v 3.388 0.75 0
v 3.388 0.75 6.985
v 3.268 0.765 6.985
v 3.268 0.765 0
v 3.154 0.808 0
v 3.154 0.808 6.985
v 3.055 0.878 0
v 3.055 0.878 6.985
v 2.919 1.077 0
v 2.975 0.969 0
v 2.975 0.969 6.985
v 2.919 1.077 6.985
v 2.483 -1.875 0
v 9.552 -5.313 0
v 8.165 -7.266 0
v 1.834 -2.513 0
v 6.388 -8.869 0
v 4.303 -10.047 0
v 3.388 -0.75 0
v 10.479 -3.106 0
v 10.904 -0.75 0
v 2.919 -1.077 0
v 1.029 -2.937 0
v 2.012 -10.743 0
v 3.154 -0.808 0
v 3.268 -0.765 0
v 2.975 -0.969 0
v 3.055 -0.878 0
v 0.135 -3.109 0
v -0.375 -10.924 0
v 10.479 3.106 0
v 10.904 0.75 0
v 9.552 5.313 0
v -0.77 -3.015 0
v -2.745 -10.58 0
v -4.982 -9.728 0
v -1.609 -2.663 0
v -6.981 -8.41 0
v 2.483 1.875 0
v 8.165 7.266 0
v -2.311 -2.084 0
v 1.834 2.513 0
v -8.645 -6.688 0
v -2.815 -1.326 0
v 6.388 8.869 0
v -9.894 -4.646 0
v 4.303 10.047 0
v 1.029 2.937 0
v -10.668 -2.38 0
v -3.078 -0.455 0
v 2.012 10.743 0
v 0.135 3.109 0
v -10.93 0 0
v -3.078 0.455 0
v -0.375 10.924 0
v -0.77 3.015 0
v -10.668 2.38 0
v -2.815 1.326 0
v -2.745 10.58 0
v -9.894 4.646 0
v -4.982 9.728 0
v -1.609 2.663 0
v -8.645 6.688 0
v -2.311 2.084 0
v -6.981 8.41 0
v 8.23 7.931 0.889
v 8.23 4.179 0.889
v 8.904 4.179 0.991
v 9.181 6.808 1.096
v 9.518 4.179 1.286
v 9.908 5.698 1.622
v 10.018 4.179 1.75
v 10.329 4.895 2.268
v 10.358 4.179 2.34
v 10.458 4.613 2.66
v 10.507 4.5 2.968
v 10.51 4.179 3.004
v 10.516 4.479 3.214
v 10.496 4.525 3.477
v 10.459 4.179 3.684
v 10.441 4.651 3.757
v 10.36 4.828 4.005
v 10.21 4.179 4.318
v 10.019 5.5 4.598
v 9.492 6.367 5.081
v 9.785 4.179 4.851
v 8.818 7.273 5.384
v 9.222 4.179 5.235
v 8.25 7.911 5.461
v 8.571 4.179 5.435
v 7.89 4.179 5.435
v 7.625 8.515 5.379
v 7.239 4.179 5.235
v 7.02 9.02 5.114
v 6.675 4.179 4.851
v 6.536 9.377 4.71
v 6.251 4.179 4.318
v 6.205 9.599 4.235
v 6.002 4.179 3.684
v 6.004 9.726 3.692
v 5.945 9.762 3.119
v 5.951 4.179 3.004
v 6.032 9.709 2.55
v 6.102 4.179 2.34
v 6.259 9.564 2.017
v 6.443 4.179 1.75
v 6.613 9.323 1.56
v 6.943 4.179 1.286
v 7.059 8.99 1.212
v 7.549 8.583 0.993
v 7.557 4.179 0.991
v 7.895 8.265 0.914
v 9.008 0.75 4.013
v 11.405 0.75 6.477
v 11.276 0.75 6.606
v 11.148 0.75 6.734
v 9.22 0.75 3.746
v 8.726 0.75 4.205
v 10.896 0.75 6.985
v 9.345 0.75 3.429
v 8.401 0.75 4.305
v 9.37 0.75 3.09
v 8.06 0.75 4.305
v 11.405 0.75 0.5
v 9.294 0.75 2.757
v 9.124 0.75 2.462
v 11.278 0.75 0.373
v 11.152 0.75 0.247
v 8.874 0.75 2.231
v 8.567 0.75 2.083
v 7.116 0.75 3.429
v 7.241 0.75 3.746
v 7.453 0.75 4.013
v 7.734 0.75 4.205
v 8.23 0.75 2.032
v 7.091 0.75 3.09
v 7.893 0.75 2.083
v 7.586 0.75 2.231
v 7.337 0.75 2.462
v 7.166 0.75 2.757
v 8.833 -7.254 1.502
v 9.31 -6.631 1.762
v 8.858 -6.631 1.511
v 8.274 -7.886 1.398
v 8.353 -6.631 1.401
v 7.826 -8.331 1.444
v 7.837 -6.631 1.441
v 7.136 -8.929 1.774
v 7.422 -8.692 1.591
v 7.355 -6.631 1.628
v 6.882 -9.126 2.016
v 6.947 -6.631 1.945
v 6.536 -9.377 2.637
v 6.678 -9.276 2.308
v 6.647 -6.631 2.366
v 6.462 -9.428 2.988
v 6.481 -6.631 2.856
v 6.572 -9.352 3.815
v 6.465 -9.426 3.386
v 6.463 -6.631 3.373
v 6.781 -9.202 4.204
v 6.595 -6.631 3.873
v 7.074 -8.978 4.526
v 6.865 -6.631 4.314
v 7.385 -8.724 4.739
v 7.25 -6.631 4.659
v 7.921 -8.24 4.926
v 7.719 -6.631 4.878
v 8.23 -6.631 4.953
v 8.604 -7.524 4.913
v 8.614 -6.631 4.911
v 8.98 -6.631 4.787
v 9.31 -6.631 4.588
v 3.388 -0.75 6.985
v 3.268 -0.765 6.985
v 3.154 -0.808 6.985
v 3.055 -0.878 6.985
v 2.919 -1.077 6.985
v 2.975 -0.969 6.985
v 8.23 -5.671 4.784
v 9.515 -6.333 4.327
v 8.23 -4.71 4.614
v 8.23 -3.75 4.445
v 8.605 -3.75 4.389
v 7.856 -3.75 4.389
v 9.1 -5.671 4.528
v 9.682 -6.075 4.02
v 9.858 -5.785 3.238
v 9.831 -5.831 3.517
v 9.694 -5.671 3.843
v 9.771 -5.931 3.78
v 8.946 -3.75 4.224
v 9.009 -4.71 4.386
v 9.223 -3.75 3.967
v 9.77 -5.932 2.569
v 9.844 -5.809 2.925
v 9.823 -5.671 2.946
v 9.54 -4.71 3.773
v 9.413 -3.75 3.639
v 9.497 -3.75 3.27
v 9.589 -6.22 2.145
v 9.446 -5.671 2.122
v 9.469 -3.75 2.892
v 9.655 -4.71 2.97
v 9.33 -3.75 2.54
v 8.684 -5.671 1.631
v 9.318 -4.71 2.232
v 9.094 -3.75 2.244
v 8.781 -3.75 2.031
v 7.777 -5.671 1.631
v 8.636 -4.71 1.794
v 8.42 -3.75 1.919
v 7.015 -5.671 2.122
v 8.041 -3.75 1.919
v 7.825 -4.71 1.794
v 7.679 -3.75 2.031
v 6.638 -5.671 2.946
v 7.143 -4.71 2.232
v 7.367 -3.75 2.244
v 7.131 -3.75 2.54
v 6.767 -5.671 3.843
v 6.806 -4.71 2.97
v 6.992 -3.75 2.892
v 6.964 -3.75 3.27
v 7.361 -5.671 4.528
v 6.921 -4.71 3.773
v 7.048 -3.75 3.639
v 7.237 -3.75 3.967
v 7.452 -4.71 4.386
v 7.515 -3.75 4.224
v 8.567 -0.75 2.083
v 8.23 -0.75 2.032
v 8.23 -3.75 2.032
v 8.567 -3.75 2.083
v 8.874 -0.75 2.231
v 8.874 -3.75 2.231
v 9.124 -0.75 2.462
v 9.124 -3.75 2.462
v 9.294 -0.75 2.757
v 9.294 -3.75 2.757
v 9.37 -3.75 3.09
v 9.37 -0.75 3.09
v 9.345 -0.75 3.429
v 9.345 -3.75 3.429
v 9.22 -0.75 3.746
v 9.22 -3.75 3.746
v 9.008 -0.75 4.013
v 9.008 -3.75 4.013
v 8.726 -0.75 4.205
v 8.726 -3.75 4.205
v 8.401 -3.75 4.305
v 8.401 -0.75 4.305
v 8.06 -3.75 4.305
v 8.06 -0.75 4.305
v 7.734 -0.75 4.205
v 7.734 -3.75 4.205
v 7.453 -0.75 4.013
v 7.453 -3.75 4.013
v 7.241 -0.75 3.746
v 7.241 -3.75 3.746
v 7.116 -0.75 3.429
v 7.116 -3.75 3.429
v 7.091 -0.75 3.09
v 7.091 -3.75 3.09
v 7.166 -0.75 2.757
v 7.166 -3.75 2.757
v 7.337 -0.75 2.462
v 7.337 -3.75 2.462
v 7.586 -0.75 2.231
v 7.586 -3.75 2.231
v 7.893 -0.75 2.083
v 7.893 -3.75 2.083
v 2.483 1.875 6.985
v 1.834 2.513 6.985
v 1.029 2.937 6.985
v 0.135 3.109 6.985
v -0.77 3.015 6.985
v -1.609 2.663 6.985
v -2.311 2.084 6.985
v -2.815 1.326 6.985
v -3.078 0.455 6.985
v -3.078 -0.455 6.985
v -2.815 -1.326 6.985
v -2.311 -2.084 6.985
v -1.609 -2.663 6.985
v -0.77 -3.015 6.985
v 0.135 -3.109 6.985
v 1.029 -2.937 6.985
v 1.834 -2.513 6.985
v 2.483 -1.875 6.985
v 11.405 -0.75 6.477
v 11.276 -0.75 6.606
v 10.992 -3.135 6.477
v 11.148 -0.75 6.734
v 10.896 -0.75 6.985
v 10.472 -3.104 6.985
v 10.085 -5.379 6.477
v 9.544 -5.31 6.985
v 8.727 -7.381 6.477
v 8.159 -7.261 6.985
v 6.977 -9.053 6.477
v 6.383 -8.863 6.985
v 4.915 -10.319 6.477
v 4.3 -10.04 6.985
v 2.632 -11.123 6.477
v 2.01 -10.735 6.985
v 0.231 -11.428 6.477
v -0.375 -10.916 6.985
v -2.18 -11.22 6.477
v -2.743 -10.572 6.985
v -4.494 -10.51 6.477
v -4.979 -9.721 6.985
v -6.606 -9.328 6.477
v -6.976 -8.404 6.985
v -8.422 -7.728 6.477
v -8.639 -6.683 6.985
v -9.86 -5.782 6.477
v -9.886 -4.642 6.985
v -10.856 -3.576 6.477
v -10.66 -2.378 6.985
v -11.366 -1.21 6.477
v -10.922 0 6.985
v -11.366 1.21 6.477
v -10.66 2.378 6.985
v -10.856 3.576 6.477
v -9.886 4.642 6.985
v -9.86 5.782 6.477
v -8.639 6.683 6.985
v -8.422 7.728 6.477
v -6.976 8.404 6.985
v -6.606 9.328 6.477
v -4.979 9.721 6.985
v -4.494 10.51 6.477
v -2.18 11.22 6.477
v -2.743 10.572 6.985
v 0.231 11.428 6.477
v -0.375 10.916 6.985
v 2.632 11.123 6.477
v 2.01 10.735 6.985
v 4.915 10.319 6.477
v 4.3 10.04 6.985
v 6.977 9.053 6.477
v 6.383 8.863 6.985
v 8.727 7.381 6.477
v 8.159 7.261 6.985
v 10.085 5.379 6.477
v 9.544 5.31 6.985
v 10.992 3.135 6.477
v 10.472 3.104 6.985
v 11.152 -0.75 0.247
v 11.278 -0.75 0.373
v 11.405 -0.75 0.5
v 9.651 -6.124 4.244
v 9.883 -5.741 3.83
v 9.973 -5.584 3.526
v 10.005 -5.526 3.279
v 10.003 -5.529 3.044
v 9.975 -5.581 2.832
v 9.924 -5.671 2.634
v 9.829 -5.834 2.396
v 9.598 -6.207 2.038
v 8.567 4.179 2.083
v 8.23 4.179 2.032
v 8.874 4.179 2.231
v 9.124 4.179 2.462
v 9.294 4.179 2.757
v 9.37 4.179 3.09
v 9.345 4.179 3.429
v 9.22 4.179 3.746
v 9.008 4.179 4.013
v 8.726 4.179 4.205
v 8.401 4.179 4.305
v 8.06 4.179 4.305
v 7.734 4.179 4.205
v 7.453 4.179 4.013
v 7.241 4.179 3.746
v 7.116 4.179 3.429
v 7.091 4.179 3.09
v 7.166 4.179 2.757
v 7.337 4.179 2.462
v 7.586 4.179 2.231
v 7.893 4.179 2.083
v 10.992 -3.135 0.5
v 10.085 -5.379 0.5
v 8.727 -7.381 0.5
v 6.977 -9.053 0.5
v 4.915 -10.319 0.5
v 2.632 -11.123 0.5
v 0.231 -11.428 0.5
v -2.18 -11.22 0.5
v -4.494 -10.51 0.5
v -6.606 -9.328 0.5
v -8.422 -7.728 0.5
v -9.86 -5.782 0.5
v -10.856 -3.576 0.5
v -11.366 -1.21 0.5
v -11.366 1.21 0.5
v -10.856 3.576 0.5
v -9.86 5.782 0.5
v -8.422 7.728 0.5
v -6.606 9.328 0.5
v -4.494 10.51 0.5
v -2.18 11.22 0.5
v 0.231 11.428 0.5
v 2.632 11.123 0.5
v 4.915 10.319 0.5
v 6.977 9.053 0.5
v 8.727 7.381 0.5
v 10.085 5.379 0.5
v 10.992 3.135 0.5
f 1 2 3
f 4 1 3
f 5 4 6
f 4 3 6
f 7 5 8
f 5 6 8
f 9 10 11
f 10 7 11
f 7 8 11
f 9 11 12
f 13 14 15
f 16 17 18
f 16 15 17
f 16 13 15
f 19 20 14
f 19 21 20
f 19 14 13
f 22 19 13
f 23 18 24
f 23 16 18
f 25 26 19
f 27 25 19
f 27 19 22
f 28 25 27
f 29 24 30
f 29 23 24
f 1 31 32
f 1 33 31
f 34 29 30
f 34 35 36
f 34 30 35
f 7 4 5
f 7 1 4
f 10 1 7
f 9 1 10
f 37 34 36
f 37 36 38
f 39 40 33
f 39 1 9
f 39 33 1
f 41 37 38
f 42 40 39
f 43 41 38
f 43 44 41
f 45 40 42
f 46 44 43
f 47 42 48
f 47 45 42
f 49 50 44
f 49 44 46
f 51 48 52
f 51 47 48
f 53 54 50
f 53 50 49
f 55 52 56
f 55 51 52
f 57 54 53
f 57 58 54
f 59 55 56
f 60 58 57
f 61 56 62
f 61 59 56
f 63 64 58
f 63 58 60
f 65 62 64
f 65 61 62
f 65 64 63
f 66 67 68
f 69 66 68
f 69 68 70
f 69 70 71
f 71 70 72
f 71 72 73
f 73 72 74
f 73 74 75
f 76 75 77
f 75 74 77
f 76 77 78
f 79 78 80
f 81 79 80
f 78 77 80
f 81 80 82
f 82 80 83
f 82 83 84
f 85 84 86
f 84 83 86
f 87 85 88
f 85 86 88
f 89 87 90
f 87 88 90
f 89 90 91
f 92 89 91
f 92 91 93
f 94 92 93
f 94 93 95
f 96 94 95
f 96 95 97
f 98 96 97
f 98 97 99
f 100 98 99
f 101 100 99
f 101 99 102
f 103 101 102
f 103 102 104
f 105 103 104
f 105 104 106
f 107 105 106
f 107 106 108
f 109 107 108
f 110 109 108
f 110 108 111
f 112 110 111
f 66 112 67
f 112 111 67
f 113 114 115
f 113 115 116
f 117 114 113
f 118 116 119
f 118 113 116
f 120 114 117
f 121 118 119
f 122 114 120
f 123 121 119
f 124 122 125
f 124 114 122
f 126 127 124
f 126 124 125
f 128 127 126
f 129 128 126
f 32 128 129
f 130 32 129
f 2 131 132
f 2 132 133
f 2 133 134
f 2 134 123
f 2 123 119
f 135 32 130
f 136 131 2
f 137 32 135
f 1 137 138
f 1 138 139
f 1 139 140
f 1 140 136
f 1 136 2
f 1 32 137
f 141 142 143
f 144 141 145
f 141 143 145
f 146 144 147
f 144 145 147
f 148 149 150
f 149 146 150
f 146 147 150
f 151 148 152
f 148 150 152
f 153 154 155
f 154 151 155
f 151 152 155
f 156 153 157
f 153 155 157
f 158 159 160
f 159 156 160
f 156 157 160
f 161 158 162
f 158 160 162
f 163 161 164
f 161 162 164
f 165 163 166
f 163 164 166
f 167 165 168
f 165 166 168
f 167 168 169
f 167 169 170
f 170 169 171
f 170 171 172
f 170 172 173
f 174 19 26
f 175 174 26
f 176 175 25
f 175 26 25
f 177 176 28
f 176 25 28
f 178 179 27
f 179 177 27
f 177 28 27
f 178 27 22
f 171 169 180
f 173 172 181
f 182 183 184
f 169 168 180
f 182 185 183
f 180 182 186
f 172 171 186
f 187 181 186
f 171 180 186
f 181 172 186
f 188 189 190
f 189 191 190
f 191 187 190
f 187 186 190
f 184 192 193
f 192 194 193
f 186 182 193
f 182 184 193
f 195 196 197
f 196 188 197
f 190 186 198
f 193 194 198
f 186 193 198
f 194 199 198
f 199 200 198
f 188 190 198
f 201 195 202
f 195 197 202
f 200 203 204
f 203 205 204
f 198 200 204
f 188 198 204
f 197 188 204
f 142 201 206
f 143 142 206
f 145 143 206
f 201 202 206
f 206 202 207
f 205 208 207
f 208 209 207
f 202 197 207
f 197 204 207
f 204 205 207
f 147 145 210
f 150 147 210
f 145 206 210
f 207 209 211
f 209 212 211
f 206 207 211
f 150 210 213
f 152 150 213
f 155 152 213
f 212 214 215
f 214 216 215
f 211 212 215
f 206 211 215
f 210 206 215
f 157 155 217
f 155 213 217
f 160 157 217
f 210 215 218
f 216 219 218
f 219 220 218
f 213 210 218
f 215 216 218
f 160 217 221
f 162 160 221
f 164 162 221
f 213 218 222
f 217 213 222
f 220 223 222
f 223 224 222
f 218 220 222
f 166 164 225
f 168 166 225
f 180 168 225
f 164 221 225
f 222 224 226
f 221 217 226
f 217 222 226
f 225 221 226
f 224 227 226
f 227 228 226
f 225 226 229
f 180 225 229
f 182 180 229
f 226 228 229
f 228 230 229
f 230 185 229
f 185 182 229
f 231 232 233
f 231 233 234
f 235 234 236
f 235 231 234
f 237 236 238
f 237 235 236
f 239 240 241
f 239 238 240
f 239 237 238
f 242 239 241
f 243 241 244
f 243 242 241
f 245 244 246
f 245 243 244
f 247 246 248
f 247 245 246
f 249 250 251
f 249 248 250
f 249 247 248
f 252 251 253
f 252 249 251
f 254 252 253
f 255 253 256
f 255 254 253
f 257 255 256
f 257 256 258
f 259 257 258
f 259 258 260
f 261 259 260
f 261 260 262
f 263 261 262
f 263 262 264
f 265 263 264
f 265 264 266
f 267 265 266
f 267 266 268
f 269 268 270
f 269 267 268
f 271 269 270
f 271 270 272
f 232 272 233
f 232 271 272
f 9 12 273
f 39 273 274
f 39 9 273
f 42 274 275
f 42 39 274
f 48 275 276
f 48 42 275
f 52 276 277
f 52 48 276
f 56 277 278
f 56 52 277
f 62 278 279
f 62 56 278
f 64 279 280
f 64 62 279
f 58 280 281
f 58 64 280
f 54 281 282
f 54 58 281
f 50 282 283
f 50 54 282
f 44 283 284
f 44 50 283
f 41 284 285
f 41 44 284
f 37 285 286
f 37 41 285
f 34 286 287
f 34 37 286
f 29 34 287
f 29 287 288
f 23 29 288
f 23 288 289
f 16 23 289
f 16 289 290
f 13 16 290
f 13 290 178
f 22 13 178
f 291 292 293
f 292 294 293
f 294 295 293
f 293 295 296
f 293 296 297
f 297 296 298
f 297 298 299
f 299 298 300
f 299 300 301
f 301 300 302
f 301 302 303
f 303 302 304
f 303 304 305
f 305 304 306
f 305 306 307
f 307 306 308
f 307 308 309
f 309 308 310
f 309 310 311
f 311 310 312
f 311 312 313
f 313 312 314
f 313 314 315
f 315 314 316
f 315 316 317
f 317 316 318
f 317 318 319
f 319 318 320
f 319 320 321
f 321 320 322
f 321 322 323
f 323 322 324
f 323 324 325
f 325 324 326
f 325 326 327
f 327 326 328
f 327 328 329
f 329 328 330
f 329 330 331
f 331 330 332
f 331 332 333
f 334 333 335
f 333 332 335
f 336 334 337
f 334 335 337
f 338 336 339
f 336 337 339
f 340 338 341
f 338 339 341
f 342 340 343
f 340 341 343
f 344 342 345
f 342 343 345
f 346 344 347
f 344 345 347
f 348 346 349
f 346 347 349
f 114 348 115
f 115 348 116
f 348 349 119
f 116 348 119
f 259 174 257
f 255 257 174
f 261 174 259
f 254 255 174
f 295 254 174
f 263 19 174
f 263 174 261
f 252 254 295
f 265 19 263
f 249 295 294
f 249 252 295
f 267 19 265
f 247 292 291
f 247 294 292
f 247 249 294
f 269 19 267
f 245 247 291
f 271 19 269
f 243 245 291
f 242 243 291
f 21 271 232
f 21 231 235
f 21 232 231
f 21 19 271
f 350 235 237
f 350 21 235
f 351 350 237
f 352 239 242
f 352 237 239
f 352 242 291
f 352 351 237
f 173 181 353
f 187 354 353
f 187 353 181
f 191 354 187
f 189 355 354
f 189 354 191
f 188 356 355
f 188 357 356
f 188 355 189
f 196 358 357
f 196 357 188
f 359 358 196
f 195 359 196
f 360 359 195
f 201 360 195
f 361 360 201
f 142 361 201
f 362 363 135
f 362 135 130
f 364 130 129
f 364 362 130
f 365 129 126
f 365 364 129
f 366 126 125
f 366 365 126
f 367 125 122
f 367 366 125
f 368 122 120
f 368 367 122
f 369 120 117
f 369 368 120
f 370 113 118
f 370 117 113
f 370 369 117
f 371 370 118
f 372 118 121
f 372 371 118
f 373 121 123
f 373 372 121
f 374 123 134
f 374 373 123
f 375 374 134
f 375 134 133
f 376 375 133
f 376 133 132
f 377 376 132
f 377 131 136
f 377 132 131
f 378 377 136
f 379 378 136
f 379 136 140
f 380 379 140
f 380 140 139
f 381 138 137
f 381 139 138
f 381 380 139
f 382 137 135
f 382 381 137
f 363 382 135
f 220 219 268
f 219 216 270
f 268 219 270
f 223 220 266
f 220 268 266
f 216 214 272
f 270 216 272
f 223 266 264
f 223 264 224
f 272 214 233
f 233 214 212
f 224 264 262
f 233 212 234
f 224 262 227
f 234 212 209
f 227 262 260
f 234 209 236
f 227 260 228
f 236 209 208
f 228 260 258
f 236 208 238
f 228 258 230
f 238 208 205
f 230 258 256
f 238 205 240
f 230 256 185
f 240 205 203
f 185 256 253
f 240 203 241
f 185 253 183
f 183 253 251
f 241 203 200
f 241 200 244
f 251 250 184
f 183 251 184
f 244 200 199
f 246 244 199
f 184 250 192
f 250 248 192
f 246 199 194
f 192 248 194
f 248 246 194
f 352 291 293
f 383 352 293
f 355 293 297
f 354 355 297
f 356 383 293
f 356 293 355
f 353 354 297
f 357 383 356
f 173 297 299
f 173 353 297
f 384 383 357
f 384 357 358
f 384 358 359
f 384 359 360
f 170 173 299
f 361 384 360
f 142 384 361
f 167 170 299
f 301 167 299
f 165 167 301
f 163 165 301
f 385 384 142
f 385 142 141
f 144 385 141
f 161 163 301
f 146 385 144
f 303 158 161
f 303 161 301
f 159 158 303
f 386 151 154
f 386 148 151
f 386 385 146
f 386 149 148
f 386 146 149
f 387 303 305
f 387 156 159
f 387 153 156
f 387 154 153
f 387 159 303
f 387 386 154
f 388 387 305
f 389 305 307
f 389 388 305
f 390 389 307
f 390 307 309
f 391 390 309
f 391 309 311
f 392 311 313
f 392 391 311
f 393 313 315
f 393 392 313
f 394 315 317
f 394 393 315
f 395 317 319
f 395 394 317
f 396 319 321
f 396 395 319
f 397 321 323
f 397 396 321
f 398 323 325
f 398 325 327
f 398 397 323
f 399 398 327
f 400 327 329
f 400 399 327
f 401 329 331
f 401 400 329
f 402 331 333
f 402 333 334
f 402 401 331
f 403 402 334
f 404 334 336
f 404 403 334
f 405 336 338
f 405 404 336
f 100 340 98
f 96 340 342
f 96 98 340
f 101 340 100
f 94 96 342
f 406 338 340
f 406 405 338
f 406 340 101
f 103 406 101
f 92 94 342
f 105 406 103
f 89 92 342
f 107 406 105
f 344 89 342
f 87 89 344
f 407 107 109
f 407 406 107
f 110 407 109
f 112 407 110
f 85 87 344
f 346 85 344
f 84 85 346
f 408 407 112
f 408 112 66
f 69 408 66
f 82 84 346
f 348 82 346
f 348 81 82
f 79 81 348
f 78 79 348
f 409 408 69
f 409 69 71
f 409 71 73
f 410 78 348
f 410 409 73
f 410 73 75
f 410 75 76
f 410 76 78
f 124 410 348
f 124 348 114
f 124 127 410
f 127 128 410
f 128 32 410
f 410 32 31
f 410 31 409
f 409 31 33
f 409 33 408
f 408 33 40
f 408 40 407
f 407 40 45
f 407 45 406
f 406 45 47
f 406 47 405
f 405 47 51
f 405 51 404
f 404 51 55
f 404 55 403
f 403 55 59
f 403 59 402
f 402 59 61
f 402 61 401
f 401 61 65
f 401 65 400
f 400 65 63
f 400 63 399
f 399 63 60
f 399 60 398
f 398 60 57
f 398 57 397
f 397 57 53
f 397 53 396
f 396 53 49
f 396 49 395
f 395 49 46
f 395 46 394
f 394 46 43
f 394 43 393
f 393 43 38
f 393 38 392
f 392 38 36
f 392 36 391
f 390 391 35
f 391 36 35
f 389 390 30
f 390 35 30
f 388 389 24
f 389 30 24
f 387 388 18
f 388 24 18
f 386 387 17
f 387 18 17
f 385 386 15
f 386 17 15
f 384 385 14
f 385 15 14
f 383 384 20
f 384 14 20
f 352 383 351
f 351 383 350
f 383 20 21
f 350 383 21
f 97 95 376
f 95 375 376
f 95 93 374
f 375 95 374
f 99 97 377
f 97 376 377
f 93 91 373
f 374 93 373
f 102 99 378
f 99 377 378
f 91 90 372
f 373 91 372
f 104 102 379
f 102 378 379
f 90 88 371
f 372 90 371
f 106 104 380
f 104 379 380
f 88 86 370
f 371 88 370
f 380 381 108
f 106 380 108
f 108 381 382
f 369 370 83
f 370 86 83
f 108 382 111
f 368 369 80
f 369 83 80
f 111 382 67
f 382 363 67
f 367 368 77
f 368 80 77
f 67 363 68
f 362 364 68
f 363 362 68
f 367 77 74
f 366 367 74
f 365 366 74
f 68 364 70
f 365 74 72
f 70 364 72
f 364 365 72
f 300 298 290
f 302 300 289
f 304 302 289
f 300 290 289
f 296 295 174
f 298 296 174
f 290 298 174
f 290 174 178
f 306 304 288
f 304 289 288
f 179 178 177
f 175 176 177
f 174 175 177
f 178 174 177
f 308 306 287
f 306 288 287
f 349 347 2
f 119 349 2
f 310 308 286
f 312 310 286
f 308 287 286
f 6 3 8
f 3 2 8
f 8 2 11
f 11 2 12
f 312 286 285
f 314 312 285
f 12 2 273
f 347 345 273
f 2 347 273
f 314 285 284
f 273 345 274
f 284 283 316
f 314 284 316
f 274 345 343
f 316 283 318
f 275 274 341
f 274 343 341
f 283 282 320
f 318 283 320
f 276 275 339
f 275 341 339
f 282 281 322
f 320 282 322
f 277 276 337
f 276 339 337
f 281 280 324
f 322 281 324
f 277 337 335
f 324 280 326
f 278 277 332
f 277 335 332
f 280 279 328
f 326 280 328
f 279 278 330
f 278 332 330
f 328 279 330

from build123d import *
from build123d.topology import SkipClean

# Parameters (mm, degrees)
BOSS_EXTRUDE1_DEPTH     = 6.985
CUT_EXTRUDE1_DEPTH      = 19.104903341
CUT_EXTRUDE1_DEPTH_BACK = 19.104903341
SKETCH2_R               = 1.143
SKETCH3_R               = 2.286
CUT_EXTRUDE2_DEPTH      = 21.568811653
BOSS_EXTRUDE2_START     = 1.27
BOSS_EXTRUDE2_DEPTH     = 1.27
BOSS_EXTRUDE3_START     = 2.54
SKETCH5_R               = 11.43
SKETCH5_R_2             = 3.1115
BOSS_EXTRUDE3_DEPTH     = 2.54
SKETCH29_R              = 1.778
CUT_EXTRUDE9_DEPTH      = 21.245185396
CHAMFER3_SIZE           = 2.881011164
CHAMFER3_SIZE_2         = 0.508
CHAMFER4_SIZE           = 0.508
FILLET1_R               = 0.5
SKETCH30_R              = 16.901185141
CUT_EXTRUDE10_DEPTH     = 3.81
CHAMFER5_SIZE           = 0.5


with BuildPart() as part:
    # Sketch1 → Boss-Extrude1 (new body)
    with BuildSketch(Plane.XY):
        with BuildLine():
            Line((3.019756985, -0.75), (11.405367158, -0.75))
            ThreePointArc((11.405367158, -0.75), (-11.43, 0), (11.405367158, 0.75))
            Line((11.405367158, 0.75), (3.019756985, 0.75))
            ThreePointArc((3.019756985, 0.75), (-3.1115, 0), (3.019756985, -0.75))
        make_face()
    extrude(amount=BOSS_EXTRUDE1_DEPTH)

    # Sketch2 → Cut-Extrude1 (cut, two sides: drawn at the far end of the back side and taken through both)
    with BuildSketch(Plane.XZ.offset(-0.75).offset(-CUT_EXTRUDE1_DEPTH_BACK)):
        with Locations(Location((8.230367158, 3.175, 0), (0, 0, 270))):
            Circle(SKETCH2_R)
    extrude(amount=CUT_EXTRUDE1_DEPTH + CUT_EXTRUDE1_DEPTH_BACK, mode=Mode.SUBTRACT)

    # Sketch3 → Cut-Extrude2 (cut, through all)
    with BuildSketch(Plane(origin=(0, 4.179, 0), x_dir=(-1, 0, 0), z_dir=(0, -1, 0))):
        with Locations(Location((-8.230367158, -3.175, 0), (0, 0, 90))):
            Circle(SKETCH3_R)
    extrude(amount=-CUT_EXTRUDE2_DEPTH, mode=Mode.SUBTRACT)

    # Sketch4 → Boss-Extrude2 (add)
    with BuildSketch(Plane(origin=(0, 0, 0), x_dir=(-1, 0, 0), z_dir=(0, 0, -1)).offset(BOSS_EXTRUDE2_START)):
        with BuildLine():
            Line((3.1115, 0), (11.43, 0))
            ThreePointArc((11.43, 0), (0.375202204, 11.42384013), (-11.405367158, 0.75))
            Line((-11.405367158, 0.75), (-3.019756985, 0.75))
            ThreePointArc((-3.019756985, 0.75), (0.377795176, 3.088479084), (3.1115, 0))
        make_face()
    extrude(amount=-BOSS_EXTRUDE2_DEPTH)

    # Sketch5 → Boss-Extrude3 (add)
    with SkipClean():  # the faces are left unmerged after this step: merging them gives an invalid solid
        with BuildSketch(Plane(origin=(0, 0, -1.27), x_dir=(-1, 0, 0), z_dir=(0, 0, -1)).offset(BOSS_EXTRUDE3_START)):
            Circle(SKETCH5_R)
            Circle(SKETCH5_R_2, mode=Mode.SUBTRACT)
        extrude(amount=-BOSS_EXTRUDE3_DEPTH)

    # Sketch29 → Cut-Extrude9 (cut, through all)
    with SkipClean():  # the faces are left unmerged after this step: merging them gives an invalid solid
        with BuildSketch(Plane(origin=(0, -3.75, 0), x_dir=(1, 0, 0), z_dir=(0, 1, 0))):
            with Locations(Location((8.230367158, -3.175, 0), (0, 0, 270))):
                Circle(SKETCH29_R)
        extrude(amount=-CUT_EXTRUDE9_DEPTH, mode=Mode.SUBTRACT)

    # Chamfer3
    # the kernel refuses this chamfer: 2.881011164, 0.508 mm, written as the material it adds along each edge
    with BuildSketch(Plane(origin=(8.230367158, -3.75, 3.175), x_dir=(0, 0, 1), z_dir=(-1, 0, 0))) as chamfer3_piece_1_section:
        Polygon((1.778, -CHAMFER3_SIZE), (1.778 - CHAMFER3_SIZE_2, 0), (1.778, 0), align=None)
    chamfer3_piece_1 = revolve(axis=Axis((8.230367158, -3.75, 3.175), (0, 1, 0)), mode=Mode.PRIVATE)
    chamfer3_piece_1 = chamfer3_piece_1 & Plane(origin=(0, 0, 1.63014176), x_dir=(0.9978448956793416, -0.06561679790026252, 0), z_dir=(0, 0, -1)) * Cylinder(11.43, 12, mode=Mode.PRIVATE)
    add(chamfer3_piece_1)

    # Chamfer4
    chamfer4_edges = [part.edges().sort_by_distance(p)[0] for p in [
        (-11.43, 0, 6.985),
    ]]
    chamfer(chamfer4_edges, length=CHAMFER4_SIZE)

    # Fillet1
    # the kernel refuses this fillet: 0.5 mm, written as the material it takes off along each edge
    with BuildSketch(Plane(origin=(-3.1115, 0, -1.27), x_dir=(-1, 0, 0), z_dir=(0, 0, 1))) as fillet1_piece_1:
        with BuildLine():
            CenterArc((0.46522088, -0.5), FILLET1_R, 90, 82.042030685)
            ThreePointArc((-0.029964068, -0.430776686), (-0.007500056, -0.215908776), (0, 0))
            Line((0, 0), (0.46522088, 0))
        make_face()
    extrude(amount=1.27, mode=Mode.SUBTRACT)
    with BuildSketch(Plane(origin=(-11.43, 0, -1.27), x_dir=(0.022878815711235678, 0.9997382456381528, 0), z_dir=(0, 0, 1))) as fillet1_piece_2:
        with BuildLine():
            CenterArc((0.511570319, -0.499869123), FILLET1_R, 88.689026033, 92.621947934)
            Line((0.011701196, -0.511308531), (0, 0))
            ThreePointArc((0, 0), (0.261504864, 0.002991852), (0.523009727, 0))
        make_face()
    extrude(amount=1.27, mode=Mode.SUBTRACT)
    with BuildSketch(Plane(origin=(3.019756985, -0.75, -0.921304177), x_dir=(1, 0, 0), z_dir=(0, 0, 1))) as fillet1_piece_3:
        with BuildLine():
            CenterArc((0.368521671, -0.5), FILLET1_R, 90, 69.75002962)
            ThreePointArc((-0.100574087, -0.326941714), (-0.04579087, -0.164853974), (0, 0))
            Line((0, 0), (0.368521671, 0))
        make_face()
    extrude(amount=8.827608353, mode=Mode.SUBTRACT)
    with BuildSketch(Plane(origin=(3.019756985, 0.75, 7.906304177), x_dir=(1, 0, 0), z_dir=(0, 0, -1))) as fillet1_piece_4:
        with BuildLine():
            CenterArc((0.368521671, -0.5), FILLET1_R, 90, 69.75002962)
            ThreePointArc((-0.100574087, -0.326941714), (-0.04579087, -0.164853974), (0, 0))
            Line((0, 0), (0.368521671, 0))
        make_face()
    extrude(amount=9.176304177, mode=Mode.SUBTRACT)

    # Sketch30 → Cut-Extrude10 (cut)
    with BuildSketch(Plane(origin=(0, 0, -3.81), x_dir=(-1, 0, 0), z_dir=(0, 0, -1))):
        Circle(SKETCH30_R)
    extrude(amount=-CUT_EXTRUDE10_DEPTH, mode=Mode.SUBTRACT)

    # Chamfer5
    chamfer5_edges = [part.edges().sort_by_distance(p)[0] for p in [
        (-11.43, 0, 0),
    ]]
    chamfer(chamfer5_edges, length=CHAMFER5_SIZE)


solid = part.part
